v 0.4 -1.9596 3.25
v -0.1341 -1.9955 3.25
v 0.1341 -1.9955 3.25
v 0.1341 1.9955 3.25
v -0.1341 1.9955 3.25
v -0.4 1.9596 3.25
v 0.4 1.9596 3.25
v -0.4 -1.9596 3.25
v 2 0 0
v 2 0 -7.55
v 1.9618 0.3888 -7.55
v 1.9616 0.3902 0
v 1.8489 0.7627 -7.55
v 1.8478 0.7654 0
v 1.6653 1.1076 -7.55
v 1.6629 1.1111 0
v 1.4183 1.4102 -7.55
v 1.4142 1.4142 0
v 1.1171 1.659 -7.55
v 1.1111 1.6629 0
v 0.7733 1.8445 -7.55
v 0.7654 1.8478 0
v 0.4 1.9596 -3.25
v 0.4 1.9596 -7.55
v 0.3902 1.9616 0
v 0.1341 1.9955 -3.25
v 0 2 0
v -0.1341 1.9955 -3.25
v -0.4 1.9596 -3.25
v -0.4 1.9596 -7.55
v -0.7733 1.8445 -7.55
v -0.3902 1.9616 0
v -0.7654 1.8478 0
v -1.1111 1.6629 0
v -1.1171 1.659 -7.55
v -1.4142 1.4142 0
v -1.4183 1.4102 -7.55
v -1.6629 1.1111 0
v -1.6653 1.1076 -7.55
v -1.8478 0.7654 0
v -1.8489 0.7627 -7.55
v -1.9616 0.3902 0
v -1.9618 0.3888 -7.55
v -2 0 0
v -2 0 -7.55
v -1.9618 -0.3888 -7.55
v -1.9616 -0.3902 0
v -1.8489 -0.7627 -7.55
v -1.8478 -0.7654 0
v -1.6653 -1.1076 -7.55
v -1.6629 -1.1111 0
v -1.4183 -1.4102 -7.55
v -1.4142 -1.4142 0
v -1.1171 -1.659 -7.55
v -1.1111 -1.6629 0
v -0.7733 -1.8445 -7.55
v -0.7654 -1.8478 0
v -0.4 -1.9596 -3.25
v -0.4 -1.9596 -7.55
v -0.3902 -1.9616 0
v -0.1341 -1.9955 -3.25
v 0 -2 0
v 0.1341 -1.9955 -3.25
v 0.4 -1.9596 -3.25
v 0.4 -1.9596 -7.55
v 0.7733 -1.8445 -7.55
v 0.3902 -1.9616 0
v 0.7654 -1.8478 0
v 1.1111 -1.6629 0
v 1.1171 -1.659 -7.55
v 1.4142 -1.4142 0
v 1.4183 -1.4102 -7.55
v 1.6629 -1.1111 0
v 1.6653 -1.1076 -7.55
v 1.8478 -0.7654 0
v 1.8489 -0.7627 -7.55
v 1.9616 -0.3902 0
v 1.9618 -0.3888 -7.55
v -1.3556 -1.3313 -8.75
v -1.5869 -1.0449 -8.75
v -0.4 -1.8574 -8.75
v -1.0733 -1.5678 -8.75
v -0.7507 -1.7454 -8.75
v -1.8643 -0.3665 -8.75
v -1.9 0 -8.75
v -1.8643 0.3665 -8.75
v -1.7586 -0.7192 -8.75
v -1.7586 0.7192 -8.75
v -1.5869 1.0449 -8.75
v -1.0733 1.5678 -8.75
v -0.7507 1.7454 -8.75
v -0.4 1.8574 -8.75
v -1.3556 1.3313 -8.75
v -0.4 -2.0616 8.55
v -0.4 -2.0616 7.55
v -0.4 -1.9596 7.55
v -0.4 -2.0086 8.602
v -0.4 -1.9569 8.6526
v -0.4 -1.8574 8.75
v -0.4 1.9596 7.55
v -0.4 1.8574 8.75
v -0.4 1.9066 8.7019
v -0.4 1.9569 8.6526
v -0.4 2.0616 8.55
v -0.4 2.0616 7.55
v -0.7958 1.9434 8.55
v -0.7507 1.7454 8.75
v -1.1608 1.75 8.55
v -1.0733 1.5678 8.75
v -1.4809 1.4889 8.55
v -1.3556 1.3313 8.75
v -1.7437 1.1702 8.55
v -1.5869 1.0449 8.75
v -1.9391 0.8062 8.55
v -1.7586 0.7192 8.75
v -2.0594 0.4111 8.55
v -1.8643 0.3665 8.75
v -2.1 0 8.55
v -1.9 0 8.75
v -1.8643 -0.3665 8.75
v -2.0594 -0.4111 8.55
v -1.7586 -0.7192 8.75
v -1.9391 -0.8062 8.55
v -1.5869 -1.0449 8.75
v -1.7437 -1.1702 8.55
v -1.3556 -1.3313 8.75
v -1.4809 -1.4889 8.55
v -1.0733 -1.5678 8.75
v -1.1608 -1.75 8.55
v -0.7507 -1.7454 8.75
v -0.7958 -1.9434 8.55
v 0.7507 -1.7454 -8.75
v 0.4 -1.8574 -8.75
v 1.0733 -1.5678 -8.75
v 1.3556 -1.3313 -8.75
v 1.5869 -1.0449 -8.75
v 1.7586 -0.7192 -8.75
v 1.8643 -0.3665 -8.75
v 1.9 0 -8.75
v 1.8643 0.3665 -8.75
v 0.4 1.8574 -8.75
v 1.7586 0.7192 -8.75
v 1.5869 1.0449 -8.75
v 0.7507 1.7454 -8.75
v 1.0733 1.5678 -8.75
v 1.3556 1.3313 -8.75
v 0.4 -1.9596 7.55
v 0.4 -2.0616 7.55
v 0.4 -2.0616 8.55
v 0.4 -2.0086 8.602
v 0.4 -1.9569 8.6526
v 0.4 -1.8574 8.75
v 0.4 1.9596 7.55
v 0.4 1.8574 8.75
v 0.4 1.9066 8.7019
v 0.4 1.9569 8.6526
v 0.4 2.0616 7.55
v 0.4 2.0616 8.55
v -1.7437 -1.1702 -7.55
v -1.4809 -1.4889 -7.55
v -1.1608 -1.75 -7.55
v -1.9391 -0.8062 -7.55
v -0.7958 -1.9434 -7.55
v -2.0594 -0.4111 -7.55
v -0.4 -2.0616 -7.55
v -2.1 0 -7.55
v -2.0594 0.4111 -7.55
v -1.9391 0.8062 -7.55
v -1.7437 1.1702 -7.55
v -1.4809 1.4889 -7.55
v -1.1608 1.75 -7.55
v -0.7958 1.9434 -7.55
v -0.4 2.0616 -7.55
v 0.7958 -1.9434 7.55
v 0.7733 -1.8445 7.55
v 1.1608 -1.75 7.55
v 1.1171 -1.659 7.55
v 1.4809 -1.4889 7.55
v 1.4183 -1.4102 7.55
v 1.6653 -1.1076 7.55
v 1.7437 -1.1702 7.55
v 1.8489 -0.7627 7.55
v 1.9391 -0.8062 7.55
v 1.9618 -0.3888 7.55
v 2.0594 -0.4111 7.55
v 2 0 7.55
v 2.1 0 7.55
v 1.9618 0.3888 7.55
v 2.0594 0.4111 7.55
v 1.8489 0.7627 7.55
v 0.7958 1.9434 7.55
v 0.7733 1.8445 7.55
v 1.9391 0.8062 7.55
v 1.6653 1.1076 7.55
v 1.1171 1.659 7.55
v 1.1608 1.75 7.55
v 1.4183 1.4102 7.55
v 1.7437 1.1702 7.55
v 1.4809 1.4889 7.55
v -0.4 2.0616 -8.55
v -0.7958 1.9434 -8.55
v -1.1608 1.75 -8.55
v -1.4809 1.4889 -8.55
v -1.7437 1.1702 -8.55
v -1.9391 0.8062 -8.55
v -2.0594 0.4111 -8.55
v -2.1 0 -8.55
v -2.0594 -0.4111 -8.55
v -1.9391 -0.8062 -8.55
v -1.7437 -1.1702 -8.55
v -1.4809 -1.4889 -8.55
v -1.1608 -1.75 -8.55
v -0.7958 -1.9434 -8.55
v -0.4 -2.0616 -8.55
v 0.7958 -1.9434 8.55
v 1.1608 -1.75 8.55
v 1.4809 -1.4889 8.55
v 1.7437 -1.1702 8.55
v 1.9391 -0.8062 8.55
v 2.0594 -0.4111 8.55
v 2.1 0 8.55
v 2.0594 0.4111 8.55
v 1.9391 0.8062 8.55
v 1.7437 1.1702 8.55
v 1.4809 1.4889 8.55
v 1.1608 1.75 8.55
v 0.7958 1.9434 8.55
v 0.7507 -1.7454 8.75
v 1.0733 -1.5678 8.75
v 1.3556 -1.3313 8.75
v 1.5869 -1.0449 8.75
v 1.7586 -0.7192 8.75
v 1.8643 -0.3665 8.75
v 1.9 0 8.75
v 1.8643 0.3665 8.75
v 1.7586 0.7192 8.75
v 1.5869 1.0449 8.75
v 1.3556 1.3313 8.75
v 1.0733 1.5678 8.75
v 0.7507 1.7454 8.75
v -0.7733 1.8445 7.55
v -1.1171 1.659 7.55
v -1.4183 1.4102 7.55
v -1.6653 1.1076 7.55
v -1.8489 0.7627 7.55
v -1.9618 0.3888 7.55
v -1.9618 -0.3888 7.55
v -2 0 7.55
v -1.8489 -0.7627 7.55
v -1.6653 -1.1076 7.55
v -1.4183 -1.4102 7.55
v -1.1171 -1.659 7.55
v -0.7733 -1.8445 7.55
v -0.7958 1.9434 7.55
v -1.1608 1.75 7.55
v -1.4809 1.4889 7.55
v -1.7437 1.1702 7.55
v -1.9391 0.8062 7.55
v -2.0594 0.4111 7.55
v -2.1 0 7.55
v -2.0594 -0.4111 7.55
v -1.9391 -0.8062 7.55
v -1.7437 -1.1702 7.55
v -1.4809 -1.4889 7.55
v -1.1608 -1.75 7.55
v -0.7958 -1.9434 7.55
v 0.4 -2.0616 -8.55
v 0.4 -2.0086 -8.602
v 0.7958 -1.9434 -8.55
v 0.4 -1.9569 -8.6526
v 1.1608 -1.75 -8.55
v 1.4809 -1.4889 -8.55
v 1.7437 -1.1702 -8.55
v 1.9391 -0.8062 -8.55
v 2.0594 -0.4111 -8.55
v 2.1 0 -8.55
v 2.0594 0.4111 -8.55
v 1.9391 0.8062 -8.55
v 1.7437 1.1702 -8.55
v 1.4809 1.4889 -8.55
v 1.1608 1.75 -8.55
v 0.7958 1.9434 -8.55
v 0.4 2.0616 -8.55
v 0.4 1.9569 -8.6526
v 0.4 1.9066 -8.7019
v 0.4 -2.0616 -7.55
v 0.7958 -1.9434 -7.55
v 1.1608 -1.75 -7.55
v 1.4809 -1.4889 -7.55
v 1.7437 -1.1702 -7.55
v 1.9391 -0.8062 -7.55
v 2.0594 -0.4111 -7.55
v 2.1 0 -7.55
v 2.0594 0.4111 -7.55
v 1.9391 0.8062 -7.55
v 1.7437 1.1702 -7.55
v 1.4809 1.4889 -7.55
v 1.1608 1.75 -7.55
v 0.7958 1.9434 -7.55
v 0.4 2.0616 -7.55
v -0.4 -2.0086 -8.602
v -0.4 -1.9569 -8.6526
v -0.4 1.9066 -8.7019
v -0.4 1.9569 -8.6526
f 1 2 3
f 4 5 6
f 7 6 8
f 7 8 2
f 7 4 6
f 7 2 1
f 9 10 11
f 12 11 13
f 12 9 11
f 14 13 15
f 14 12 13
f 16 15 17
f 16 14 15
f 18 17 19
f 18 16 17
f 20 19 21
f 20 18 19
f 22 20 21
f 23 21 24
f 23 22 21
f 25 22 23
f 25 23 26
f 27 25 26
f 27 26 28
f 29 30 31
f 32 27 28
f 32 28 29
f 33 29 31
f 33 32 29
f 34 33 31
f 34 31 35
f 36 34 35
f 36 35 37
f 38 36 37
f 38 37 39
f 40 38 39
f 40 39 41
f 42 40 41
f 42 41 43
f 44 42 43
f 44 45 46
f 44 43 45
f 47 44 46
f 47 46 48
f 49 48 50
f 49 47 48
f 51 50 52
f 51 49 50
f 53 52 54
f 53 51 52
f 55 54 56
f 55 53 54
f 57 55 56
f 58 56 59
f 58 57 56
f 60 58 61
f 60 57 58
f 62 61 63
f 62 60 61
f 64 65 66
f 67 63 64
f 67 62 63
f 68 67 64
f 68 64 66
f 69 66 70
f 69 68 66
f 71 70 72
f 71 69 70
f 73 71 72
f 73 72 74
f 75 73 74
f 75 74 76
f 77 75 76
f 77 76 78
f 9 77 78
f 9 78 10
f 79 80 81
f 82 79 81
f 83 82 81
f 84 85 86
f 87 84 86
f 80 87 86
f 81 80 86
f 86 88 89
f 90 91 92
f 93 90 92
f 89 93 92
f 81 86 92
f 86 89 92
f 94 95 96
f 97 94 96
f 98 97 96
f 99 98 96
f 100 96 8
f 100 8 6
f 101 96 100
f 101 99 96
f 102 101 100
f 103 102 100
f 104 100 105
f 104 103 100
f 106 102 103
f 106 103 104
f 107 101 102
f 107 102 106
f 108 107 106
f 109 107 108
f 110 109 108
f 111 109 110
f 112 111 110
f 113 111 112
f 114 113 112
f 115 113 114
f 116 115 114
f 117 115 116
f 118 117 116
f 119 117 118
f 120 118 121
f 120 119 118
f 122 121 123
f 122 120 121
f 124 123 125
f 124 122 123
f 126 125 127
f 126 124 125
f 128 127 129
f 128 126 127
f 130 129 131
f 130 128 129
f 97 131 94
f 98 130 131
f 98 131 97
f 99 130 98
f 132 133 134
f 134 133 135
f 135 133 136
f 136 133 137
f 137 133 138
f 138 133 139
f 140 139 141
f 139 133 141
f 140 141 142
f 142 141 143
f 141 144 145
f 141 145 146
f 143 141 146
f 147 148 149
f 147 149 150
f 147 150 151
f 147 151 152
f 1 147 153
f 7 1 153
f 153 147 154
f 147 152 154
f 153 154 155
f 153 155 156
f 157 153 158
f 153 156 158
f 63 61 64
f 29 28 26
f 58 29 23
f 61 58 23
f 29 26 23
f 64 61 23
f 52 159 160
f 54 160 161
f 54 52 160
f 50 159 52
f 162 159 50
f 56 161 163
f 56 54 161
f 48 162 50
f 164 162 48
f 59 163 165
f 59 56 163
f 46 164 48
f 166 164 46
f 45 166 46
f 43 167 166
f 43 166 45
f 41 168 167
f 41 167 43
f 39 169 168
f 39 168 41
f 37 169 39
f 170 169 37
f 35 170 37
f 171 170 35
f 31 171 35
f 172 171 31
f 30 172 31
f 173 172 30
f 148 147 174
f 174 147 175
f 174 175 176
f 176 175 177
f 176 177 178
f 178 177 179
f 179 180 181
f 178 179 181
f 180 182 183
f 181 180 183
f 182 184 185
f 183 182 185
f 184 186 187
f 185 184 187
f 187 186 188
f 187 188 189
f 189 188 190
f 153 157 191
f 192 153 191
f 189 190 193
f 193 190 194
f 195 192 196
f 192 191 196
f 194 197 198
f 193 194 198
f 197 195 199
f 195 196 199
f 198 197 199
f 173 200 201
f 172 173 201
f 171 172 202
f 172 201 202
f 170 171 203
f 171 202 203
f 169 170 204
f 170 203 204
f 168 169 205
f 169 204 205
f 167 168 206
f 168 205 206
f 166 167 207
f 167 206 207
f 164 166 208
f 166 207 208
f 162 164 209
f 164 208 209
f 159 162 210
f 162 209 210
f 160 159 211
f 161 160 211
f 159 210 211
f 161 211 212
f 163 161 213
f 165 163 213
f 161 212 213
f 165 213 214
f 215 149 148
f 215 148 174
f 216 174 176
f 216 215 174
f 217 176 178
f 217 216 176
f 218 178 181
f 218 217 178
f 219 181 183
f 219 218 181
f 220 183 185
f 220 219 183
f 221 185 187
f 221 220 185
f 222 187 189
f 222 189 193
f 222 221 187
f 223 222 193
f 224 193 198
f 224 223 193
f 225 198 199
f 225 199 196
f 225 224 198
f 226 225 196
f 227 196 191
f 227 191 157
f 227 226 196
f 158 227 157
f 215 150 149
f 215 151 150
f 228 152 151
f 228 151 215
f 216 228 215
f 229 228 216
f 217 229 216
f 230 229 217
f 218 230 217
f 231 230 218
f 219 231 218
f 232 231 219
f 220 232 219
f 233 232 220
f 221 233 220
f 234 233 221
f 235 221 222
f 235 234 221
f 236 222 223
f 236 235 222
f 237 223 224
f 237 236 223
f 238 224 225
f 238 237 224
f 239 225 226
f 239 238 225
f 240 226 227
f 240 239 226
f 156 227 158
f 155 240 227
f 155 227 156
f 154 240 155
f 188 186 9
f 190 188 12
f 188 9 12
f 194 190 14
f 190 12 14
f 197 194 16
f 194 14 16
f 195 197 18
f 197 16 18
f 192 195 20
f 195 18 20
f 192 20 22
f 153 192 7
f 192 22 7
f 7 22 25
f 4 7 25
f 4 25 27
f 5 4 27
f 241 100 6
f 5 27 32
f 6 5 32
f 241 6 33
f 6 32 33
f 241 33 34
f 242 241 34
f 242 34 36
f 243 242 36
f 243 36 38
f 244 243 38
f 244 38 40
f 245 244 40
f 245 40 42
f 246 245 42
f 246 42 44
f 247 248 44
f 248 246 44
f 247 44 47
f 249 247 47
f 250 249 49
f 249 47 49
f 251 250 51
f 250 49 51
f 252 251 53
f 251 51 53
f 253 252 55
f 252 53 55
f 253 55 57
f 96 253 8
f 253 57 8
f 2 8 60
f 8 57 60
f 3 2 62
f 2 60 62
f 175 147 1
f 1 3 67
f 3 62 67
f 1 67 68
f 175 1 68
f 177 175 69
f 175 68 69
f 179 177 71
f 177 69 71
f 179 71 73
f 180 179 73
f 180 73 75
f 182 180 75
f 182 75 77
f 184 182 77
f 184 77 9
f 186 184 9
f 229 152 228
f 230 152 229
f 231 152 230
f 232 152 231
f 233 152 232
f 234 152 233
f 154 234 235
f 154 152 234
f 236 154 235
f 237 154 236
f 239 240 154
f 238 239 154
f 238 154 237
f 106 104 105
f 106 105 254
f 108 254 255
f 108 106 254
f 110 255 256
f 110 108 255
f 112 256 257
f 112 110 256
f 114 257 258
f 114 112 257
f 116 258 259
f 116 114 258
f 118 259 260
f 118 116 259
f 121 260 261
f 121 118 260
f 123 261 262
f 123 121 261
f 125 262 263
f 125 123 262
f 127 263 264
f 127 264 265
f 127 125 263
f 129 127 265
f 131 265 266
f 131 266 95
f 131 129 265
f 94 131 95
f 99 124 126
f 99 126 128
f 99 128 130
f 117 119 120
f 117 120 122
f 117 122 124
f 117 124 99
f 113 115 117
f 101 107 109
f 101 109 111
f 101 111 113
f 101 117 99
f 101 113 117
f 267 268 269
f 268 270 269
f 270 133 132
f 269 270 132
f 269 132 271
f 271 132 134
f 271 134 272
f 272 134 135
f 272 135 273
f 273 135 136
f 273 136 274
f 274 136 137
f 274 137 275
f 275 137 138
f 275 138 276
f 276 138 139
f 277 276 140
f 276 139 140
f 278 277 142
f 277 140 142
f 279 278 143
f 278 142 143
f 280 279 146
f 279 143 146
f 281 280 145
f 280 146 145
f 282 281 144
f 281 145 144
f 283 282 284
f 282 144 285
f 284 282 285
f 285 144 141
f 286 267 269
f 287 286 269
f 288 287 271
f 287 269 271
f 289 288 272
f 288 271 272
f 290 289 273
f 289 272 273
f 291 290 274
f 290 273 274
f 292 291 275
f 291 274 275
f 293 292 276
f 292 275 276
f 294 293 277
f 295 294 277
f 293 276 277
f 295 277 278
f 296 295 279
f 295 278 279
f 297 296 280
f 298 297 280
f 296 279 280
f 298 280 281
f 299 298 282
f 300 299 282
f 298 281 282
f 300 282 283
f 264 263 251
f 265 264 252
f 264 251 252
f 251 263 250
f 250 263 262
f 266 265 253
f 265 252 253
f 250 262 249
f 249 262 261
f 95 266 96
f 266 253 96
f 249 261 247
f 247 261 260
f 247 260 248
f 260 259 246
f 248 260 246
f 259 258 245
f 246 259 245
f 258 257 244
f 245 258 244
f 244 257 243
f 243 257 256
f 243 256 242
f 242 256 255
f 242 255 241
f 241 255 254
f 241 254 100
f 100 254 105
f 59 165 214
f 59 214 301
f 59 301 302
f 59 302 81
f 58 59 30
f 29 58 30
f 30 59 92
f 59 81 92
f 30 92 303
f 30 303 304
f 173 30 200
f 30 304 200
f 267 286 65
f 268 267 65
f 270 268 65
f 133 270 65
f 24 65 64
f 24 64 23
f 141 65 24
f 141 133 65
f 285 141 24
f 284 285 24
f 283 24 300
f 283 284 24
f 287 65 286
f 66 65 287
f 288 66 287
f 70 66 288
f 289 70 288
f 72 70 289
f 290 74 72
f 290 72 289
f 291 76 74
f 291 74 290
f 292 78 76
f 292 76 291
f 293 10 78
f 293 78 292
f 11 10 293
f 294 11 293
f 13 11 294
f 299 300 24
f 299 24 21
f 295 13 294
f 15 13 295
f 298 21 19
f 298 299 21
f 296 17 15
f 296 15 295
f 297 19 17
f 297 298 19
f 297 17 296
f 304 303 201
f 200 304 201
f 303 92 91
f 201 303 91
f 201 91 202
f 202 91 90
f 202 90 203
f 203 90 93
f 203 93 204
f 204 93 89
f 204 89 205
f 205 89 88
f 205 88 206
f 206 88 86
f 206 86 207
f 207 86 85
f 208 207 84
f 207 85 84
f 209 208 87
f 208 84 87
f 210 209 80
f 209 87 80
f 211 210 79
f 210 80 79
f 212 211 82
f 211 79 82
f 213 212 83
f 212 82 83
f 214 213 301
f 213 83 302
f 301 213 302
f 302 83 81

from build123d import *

# Parameters (mm, degrees)
SKETCH_1_R          = 2
EXTRUDE_1_DEPTH     = 8.75
SKETCH_2_R          = 2.1
EXTRUDE_2_DEPTH     = 1.2
CHAMFER_1_SIZE      = 0.2
SKETCH_3_W          = 0.8
SKETCH_3_H          = 4.5
CUT_EXTRUDE_1_DEPTH = 5.5


# Read off the part's stored shape, not the designer's step: 镜向1
with BuildPart() as part:
    # 草图1 → 凸台-拉伸1 (new body)
    with BuildSketch(Plane.XY):
        Circle(SKETCH_1_R)
    extrude(amount=EXTRUDE_1_DEPTH)

    # 草图2 → 凸台-拉伸2 (add)
    with BuildSketch(Plane.XY.offset(8.75)):
        Circle(SKETCH_2_R)
    extrude(amount=-EXTRUDE_2_DEPTH)

    # 倒角1
    chamfer_1_edges = [part.edges().sort_by_distance(p)[0] for p in [
        (-2.1, 0, 8.75),
    ]]
    chamfer(chamfer_1_edges, length=CHAMFER_1_SIZE)

    # 草图3 → 切除-拉伸1 (cut)
    with BuildSketch(Plane.XY.offset(8.75)):
        Rectangle(SKETCH_3_W, SKETCH_3_H)
    extrude(amount=-CUT_EXTRUDE_1_DEPTH, mode=Mode.SUBTRACT)

    # 镜向1: part across plane


with BuildPart() as part_1:
    add(part.part)
    add(part.part.mirror(Plane.XY))


solid = part_1.part
